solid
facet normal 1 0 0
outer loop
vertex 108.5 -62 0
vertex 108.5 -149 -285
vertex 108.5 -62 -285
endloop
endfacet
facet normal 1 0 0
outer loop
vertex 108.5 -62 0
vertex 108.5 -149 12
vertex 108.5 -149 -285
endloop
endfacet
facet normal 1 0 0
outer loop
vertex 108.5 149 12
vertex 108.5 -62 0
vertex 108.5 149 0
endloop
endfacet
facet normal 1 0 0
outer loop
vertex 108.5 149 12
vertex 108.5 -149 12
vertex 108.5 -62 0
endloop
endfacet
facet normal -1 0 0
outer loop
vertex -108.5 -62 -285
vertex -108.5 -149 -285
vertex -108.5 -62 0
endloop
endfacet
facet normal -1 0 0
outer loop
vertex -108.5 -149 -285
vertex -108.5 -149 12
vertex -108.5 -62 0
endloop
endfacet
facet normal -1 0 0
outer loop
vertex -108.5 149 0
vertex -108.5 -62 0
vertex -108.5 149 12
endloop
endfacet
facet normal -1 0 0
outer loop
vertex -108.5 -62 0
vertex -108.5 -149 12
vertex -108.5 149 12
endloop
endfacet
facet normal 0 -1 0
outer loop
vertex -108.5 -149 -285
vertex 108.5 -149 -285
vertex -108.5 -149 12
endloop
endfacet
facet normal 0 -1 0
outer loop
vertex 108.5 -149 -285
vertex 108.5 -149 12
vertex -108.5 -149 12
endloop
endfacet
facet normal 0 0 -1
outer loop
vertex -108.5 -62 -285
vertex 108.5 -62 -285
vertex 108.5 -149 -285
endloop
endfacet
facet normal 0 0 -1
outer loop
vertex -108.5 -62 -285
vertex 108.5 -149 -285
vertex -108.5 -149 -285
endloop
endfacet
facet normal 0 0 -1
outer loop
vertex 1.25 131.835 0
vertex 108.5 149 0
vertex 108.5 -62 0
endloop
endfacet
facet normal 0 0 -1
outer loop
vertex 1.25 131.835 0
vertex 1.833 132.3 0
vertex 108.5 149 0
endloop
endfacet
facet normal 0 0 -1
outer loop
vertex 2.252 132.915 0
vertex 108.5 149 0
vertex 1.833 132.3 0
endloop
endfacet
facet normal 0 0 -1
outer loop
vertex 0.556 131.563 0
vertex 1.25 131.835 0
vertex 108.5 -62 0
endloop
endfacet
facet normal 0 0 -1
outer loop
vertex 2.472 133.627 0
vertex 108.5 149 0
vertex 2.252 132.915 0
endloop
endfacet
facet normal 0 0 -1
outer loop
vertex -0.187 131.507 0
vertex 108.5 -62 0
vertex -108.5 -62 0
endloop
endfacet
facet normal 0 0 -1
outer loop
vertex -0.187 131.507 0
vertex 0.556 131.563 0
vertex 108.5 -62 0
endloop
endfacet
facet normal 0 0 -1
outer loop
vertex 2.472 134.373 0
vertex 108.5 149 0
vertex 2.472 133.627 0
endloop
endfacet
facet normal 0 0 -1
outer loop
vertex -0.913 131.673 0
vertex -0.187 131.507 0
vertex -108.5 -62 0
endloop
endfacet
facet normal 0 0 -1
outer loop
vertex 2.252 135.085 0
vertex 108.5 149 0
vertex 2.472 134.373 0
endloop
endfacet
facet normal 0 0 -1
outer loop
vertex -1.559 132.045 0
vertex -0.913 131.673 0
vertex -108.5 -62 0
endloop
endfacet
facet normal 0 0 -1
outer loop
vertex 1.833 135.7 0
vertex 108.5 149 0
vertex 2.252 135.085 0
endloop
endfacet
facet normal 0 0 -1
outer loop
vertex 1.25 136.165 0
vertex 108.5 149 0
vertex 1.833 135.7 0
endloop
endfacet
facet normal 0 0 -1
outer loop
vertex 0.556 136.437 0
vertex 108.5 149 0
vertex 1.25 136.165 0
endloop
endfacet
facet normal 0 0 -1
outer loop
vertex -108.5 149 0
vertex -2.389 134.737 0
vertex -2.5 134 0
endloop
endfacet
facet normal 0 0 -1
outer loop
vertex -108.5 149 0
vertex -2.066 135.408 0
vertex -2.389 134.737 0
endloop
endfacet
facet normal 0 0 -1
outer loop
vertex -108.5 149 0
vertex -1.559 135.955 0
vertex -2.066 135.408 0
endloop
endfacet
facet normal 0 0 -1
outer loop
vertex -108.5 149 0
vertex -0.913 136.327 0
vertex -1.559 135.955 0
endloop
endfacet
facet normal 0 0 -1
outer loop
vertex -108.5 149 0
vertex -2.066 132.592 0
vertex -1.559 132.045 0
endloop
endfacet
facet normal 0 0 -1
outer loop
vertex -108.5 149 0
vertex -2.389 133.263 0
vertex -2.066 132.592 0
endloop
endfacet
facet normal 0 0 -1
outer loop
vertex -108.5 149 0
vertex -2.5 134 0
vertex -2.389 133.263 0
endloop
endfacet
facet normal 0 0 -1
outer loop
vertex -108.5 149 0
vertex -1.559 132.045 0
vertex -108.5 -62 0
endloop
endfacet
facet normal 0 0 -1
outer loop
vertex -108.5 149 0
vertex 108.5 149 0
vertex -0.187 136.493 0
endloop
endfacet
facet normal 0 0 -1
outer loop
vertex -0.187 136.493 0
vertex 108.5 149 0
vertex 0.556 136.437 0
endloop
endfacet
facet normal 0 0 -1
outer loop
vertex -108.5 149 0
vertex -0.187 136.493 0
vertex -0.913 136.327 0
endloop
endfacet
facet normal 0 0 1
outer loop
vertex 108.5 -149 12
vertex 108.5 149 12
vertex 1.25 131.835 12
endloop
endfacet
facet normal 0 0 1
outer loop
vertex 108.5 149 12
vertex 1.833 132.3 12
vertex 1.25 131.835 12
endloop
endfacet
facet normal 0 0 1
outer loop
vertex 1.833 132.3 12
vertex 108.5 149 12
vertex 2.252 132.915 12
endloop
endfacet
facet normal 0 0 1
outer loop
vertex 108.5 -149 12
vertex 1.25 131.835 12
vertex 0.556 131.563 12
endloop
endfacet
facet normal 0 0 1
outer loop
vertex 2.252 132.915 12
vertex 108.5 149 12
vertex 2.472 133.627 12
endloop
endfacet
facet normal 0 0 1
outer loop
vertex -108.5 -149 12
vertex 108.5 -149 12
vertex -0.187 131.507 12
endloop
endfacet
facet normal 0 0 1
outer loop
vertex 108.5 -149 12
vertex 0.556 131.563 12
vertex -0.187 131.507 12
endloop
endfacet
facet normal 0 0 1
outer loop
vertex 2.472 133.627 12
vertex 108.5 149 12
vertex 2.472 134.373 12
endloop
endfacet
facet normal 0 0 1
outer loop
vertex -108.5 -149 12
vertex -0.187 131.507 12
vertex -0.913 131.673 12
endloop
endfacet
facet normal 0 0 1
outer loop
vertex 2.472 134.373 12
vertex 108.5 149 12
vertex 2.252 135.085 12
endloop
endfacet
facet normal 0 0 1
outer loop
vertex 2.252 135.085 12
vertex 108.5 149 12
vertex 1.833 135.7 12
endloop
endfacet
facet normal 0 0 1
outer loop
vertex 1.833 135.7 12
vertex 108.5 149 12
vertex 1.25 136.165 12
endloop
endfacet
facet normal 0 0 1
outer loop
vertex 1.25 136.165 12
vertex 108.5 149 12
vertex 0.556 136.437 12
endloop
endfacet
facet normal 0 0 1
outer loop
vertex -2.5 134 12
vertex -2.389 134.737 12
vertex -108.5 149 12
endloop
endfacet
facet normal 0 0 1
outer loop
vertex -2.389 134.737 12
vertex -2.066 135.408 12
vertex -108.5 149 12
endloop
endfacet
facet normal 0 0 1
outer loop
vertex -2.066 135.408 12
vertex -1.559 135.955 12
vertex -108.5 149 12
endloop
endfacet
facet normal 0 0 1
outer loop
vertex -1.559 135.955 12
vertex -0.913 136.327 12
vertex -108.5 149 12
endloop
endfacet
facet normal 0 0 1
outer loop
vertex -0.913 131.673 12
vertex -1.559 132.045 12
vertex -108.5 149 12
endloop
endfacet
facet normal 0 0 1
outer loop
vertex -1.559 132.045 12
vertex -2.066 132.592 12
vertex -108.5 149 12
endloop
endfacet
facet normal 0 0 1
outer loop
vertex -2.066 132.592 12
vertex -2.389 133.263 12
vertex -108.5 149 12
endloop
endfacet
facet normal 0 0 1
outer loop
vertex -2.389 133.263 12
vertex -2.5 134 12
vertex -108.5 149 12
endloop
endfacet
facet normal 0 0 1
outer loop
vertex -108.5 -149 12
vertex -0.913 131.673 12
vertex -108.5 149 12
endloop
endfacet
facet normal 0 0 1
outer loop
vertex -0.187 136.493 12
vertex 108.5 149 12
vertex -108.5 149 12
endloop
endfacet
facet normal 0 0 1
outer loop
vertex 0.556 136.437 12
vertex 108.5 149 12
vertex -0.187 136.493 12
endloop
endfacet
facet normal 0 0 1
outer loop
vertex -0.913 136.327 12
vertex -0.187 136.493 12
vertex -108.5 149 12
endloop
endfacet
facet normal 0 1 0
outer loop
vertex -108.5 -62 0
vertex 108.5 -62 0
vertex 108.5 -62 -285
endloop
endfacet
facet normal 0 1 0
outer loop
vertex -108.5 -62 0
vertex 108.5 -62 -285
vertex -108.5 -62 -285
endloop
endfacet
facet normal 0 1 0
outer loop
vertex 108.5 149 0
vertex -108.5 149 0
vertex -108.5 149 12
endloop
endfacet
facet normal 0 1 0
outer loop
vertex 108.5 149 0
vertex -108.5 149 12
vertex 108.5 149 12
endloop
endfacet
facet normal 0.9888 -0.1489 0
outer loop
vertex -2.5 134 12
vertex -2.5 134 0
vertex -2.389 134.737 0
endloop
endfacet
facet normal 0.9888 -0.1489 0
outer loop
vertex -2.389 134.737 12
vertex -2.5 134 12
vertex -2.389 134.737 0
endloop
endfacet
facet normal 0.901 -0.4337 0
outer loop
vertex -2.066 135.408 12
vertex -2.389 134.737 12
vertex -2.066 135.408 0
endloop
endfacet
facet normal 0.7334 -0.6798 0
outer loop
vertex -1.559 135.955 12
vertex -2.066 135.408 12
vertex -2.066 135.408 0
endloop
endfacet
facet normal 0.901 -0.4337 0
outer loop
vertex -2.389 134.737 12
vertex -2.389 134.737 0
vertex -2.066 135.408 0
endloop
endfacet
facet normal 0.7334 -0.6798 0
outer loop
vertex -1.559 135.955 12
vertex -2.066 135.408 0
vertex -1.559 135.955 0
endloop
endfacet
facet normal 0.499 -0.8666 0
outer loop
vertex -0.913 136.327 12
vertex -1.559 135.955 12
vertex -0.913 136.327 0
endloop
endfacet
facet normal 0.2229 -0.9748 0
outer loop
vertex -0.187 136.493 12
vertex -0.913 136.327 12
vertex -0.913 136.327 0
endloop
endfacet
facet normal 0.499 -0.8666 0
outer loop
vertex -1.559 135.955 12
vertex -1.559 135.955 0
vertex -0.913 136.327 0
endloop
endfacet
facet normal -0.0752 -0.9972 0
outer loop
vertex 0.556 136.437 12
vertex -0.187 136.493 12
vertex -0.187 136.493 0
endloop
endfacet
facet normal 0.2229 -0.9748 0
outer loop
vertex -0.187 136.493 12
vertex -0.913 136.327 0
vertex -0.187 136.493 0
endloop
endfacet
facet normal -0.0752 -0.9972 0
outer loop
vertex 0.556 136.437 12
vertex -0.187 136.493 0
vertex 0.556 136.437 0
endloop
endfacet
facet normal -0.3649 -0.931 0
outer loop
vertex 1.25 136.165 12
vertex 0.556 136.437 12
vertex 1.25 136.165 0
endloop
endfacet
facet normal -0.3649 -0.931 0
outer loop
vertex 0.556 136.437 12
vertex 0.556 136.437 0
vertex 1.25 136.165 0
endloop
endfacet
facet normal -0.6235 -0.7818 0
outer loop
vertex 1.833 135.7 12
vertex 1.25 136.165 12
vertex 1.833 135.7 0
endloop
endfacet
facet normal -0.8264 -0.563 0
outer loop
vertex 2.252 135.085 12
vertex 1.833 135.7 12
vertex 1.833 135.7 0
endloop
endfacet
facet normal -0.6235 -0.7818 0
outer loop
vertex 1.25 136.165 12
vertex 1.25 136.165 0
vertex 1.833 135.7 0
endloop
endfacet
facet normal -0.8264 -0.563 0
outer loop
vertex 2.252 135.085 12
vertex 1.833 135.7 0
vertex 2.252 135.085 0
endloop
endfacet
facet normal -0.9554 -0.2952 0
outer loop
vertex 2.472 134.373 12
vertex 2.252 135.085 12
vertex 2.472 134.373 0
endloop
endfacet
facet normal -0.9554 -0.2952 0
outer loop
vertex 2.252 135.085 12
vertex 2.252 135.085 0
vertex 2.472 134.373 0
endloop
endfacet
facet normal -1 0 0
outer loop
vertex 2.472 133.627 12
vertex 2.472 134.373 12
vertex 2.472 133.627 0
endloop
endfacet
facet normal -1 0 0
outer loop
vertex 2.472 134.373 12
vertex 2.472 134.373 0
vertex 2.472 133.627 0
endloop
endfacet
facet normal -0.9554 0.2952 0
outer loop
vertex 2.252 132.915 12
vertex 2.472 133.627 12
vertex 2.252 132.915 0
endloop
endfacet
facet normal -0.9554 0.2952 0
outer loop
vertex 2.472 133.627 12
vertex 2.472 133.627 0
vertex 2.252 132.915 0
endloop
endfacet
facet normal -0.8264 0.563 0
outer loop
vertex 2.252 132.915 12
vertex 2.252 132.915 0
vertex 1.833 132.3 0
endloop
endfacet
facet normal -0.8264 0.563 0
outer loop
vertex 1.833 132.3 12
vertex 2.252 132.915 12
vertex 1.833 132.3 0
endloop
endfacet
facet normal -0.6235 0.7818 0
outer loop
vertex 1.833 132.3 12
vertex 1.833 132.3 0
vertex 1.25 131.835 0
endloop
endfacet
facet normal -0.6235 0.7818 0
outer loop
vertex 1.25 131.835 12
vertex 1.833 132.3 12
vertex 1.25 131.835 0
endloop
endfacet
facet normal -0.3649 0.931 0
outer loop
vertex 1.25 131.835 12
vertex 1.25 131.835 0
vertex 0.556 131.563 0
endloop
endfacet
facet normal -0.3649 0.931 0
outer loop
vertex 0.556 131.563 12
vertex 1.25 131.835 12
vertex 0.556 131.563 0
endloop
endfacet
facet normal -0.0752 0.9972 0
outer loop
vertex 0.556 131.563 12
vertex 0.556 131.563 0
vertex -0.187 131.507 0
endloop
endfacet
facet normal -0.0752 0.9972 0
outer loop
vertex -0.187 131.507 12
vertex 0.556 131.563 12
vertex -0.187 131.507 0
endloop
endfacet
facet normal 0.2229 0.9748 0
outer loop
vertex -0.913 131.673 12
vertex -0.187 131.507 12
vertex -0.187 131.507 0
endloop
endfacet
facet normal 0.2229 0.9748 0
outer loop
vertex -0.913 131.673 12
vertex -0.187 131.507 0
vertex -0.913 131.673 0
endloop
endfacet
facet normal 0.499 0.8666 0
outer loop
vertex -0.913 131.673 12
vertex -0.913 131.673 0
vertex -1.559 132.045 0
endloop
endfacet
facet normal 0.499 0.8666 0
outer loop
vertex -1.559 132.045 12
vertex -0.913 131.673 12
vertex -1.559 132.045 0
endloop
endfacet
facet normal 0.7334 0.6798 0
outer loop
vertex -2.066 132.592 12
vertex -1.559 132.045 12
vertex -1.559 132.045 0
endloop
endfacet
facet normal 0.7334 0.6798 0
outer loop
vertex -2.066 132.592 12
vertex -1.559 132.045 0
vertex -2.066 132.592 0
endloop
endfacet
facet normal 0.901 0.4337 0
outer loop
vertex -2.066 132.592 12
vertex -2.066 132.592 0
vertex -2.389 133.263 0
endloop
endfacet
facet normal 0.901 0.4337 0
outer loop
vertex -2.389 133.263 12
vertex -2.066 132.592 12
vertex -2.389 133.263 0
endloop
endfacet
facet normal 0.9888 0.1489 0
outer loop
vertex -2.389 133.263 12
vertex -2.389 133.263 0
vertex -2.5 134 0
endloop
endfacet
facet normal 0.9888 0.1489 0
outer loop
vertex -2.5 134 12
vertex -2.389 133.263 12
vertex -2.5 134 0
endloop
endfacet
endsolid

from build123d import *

# Parameters (mm, degrees)
BOSS_EXTRUDE1_DEPTH = 12
SKETCH2_R           = 2.5
CUT_EXTRUDE1_DEPTH  = 13
SKETCH3_W           = 217
SKETCH3_H           = 87
BOSS_EXTRUDE2_DEPTH = 285


with BuildPart() as part:
    # Sketch1 → Boss-Extrude1 (new body)
    with BuildSketch(Plane.XY):
        Polygon((-108.5, 149), (108.5, 149), (108.5, -107), (108.5, -149), (-108.5, -149), (-108.5, -107), align=None)
    extrude(amount=BOSS_EXTRUDE1_DEPTH)

    # Sketch2 → Cut-Extrude1 (cut, through all)
    with BuildSketch(Plane(origin=(0, 0, 0), x_dir=(-1, 0, 0), z_dir=(0, 0, -1))):
        with Locations((0, 134)):
            Circle(SKETCH2_R)
    extrude(amount=-CUT_EXTRUDE1_DEPTH, mode=Mode.SUBTRACT)

    # Sketch3 → Boss-Extrude2 (add)
    with BuildSketch(Plane(origin=(0, 0, 0), x_dir=(-1, 0, 0), z_dir=(0, 0, -1))):
        with Locations((0, -105.5)):
            Rectangle(SKETCH3_W, SKETCH3_H)
    extrude(amount=BOSS_EXTRUDE2_DEPTH)


solid = part.part
